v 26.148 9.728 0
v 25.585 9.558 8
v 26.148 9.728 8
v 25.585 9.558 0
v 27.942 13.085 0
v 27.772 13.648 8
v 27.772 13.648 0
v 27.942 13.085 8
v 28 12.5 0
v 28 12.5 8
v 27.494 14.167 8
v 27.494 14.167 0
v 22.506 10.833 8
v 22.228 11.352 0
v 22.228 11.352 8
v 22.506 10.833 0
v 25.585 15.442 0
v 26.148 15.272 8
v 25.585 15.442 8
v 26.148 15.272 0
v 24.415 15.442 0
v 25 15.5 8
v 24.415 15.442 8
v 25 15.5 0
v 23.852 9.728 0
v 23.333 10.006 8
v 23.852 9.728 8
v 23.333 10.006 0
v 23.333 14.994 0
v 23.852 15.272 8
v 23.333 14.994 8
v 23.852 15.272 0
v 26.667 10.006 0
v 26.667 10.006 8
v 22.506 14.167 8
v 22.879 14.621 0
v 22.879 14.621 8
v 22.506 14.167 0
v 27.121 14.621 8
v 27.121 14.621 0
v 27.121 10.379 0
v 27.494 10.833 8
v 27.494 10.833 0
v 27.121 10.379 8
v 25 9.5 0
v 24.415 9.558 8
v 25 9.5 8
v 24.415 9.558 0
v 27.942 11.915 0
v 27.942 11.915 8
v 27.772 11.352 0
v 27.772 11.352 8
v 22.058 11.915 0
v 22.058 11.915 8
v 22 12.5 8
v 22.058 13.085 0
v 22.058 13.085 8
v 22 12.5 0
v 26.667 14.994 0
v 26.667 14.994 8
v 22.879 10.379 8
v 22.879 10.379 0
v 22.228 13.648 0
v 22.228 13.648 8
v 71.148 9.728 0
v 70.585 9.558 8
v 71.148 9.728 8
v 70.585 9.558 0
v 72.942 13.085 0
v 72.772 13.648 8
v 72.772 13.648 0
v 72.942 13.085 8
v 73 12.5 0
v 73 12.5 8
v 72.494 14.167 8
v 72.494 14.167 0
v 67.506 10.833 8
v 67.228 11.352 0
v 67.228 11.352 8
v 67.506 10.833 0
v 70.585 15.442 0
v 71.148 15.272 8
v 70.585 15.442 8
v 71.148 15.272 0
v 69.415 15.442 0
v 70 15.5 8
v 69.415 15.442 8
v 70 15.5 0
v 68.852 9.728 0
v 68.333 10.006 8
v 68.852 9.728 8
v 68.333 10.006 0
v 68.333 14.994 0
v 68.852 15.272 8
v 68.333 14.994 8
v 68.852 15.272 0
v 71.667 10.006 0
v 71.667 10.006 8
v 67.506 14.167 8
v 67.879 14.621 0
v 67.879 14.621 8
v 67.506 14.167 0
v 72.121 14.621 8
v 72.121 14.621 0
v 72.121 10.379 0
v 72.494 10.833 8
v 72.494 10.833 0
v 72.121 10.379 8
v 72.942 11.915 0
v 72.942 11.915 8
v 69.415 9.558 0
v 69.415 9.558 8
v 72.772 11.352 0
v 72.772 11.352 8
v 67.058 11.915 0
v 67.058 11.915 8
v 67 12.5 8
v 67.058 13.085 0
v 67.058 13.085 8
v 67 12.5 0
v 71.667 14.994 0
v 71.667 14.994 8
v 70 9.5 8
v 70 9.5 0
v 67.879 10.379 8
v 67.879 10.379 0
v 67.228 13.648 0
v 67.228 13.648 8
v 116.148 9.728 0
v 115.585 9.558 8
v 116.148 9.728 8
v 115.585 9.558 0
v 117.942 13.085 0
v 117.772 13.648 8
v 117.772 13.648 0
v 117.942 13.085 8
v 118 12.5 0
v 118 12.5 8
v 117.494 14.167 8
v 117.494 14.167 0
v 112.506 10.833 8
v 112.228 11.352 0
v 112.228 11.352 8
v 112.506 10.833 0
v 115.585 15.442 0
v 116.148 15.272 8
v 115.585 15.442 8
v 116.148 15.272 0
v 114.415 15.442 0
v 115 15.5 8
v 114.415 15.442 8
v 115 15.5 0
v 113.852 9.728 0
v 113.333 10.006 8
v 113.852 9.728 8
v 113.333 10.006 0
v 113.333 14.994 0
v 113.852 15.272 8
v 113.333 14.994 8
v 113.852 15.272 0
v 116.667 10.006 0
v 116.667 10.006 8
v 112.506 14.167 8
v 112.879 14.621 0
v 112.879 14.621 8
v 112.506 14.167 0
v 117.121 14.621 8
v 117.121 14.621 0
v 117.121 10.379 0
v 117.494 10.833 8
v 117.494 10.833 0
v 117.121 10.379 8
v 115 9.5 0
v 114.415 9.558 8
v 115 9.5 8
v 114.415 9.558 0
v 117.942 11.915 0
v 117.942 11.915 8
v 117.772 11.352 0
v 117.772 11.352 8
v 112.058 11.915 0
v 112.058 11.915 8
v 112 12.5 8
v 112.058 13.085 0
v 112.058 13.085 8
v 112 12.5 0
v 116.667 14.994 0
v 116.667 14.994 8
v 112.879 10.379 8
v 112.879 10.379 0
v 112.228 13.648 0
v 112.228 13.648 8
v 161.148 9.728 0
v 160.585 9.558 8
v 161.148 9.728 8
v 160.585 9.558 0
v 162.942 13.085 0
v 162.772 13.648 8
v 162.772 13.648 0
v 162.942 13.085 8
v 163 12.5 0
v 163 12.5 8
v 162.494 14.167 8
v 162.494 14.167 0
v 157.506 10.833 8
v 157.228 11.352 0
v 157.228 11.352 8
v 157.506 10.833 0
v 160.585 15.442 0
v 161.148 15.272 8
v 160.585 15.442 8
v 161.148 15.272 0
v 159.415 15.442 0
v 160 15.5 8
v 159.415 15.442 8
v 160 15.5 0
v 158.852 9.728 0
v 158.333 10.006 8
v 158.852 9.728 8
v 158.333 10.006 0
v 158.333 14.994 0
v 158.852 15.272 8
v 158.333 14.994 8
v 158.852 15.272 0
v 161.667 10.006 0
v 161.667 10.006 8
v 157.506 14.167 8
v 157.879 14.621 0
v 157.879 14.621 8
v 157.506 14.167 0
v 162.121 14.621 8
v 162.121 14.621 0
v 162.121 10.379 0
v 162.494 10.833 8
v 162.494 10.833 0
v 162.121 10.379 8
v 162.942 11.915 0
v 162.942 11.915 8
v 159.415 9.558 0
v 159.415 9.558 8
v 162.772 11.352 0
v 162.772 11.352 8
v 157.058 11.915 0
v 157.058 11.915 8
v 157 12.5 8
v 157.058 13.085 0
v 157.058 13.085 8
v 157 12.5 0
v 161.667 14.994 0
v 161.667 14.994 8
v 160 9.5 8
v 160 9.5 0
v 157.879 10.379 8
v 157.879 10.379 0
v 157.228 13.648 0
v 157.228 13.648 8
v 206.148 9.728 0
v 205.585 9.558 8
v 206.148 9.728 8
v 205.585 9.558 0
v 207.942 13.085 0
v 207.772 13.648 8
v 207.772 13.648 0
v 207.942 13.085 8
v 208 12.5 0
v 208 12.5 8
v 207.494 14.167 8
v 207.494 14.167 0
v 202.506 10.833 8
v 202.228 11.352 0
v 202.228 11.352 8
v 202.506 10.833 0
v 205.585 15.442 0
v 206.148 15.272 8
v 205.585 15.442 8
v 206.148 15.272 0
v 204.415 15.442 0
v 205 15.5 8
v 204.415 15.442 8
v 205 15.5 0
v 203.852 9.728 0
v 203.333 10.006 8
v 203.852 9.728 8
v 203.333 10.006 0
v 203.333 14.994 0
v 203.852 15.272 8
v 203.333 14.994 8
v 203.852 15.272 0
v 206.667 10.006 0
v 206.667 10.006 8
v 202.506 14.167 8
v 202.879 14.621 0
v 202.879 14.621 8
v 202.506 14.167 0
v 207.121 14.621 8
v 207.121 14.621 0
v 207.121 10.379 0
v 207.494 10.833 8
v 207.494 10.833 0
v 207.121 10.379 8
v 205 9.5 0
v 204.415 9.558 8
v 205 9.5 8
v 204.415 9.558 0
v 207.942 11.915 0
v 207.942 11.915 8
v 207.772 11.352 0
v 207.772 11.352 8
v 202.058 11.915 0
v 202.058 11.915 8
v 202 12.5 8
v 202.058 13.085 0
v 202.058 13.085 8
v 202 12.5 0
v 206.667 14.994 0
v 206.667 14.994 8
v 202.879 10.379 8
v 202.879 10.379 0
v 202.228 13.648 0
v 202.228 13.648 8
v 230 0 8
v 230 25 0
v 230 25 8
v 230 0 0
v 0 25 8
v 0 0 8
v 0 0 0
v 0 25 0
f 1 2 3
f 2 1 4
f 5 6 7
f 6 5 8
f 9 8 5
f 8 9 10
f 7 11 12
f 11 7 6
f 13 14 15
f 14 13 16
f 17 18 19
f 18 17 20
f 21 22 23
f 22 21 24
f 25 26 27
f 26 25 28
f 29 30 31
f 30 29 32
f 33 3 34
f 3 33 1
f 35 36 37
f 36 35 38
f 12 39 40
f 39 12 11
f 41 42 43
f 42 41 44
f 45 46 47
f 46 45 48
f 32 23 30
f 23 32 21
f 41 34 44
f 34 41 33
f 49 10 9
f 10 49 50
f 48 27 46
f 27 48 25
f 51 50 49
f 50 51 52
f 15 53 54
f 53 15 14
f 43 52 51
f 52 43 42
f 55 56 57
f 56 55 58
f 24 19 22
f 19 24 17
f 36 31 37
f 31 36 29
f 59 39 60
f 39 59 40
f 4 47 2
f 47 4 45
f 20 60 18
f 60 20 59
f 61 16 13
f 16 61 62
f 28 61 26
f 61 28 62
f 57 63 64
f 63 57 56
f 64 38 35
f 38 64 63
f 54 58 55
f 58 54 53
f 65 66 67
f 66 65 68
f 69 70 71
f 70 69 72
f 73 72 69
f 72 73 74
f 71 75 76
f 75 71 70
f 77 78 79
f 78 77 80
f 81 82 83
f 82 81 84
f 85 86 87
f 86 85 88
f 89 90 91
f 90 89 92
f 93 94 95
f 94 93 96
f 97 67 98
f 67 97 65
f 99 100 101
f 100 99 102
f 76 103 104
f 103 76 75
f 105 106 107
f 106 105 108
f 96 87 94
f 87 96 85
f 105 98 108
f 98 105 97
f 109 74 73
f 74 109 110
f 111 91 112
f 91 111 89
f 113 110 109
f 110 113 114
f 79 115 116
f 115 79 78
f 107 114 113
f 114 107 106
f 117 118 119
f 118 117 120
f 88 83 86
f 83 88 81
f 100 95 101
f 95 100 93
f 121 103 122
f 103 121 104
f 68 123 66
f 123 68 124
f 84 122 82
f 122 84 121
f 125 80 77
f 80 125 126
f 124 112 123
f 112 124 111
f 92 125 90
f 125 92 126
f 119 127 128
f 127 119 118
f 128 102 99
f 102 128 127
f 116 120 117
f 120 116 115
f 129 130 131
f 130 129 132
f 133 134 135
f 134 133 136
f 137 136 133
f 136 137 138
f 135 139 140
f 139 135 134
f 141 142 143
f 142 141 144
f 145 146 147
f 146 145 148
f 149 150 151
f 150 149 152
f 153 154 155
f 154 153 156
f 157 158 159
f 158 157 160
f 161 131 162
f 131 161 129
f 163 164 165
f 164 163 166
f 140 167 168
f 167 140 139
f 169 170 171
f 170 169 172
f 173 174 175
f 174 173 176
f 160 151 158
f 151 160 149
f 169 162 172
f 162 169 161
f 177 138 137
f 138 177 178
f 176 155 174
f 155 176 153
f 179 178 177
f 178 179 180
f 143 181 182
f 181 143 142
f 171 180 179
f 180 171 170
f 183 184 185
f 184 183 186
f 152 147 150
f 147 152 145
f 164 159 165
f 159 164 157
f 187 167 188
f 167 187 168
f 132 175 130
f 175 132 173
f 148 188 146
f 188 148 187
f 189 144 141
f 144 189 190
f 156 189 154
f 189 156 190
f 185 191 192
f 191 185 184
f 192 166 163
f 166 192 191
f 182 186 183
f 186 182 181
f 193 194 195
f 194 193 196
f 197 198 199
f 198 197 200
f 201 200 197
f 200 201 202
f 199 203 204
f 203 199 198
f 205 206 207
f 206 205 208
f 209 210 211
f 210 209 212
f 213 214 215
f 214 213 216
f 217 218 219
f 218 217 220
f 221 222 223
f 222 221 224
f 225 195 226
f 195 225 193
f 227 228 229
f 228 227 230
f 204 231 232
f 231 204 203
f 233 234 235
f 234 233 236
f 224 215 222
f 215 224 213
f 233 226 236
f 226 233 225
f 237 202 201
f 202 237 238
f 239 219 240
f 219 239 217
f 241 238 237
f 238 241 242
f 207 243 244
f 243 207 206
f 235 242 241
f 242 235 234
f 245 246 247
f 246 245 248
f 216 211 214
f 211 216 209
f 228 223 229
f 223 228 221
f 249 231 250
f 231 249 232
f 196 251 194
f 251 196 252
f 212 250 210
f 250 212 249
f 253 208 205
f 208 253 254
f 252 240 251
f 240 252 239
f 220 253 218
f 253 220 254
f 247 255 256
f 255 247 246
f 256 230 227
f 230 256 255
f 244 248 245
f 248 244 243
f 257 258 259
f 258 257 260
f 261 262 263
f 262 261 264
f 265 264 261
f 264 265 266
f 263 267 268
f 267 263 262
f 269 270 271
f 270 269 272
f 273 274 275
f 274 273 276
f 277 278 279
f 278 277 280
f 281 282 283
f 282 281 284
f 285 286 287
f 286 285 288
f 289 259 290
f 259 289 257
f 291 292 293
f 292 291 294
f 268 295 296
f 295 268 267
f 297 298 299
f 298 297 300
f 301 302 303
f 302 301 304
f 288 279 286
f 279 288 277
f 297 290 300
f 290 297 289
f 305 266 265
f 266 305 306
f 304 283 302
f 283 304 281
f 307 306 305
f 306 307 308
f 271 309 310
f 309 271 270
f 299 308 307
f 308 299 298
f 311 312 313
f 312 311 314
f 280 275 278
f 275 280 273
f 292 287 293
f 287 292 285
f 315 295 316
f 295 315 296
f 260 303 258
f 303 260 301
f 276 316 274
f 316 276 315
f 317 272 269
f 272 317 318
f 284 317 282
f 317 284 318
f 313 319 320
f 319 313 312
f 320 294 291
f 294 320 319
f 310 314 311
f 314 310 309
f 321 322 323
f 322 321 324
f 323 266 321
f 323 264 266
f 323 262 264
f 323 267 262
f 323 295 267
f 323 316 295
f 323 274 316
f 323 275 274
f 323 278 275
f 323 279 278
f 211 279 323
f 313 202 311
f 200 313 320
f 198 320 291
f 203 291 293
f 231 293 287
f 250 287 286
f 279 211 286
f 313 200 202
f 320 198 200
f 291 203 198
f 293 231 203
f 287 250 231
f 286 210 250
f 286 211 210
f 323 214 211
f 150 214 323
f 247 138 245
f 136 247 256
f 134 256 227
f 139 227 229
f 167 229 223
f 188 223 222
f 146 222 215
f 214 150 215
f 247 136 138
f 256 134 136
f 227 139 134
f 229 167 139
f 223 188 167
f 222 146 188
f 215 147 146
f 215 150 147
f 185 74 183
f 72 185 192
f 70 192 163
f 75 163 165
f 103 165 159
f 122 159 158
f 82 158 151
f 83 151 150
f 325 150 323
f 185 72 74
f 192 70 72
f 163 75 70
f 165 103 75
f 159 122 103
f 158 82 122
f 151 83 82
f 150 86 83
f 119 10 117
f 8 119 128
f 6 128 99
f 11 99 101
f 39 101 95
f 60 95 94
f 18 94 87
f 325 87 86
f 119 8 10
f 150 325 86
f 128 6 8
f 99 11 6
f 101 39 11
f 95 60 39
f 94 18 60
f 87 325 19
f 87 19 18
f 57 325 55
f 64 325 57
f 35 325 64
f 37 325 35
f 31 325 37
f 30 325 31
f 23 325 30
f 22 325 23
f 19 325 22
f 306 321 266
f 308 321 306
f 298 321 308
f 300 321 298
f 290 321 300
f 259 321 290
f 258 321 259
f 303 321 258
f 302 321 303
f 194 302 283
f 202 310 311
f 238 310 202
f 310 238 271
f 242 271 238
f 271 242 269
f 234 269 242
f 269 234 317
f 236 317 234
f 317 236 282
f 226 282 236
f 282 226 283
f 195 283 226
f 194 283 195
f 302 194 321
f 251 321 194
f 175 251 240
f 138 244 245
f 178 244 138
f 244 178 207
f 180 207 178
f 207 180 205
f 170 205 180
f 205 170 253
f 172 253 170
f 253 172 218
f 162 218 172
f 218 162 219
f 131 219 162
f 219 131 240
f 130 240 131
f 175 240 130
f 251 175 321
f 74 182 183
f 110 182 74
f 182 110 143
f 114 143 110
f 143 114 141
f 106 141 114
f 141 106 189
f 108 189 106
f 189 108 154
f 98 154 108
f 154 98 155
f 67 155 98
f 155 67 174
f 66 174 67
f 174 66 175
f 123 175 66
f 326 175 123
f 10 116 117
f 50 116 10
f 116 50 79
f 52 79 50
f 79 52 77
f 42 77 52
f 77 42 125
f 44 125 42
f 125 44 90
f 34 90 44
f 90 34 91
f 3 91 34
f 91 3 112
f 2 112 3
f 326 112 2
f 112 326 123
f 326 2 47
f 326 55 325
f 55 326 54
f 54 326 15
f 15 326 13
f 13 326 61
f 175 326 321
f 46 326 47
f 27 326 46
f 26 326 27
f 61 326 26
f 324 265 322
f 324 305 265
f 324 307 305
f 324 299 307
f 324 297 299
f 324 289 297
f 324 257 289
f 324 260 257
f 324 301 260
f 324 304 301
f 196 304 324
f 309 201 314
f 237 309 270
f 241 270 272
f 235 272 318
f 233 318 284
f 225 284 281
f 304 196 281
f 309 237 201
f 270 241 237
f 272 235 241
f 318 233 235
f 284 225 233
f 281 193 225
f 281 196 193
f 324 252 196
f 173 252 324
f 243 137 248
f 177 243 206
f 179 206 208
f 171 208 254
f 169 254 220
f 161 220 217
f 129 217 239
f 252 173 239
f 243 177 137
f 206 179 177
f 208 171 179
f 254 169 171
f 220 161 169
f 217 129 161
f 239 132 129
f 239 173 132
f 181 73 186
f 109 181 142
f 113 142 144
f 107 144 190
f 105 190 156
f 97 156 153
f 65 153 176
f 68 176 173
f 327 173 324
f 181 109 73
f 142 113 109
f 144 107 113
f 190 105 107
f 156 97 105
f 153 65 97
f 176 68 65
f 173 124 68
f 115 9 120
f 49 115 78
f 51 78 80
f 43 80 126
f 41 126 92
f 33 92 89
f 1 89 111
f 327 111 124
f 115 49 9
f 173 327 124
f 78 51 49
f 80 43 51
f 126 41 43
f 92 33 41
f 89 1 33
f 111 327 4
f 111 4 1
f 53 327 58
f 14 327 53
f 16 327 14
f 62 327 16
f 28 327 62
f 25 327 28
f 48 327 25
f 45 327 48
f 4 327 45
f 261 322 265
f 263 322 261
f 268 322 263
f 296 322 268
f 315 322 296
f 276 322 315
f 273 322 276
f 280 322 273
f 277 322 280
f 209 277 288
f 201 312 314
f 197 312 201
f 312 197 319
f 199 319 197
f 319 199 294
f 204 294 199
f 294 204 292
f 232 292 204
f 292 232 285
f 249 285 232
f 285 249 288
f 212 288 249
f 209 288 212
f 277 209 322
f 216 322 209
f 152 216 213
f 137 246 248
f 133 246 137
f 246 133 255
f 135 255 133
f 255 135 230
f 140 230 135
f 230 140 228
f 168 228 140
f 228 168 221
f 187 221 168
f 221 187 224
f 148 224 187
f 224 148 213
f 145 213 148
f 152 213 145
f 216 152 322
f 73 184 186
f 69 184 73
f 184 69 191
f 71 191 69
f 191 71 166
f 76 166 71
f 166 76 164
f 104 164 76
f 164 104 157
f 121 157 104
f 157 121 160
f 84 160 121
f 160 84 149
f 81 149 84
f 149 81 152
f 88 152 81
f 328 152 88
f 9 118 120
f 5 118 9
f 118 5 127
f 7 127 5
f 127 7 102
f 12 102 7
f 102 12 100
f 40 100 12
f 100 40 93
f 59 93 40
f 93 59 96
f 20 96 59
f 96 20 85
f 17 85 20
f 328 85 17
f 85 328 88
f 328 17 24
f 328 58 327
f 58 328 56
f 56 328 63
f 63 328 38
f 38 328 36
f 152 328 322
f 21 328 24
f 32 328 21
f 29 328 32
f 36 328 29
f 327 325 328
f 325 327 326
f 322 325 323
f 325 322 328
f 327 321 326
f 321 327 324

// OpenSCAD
$fn = 32;

// ----------------------------------------------------------------------
// Long rail: 200-250 mm mounting rail
// ----------------------------------------------------------------------

// --- parameters (mm) ---
rail_l = 230;             // rail length, X
rail_w = 25;              // rail width, Y
rail_t = 8;               // rail thickness, Z
hole_d = 6;               // mounting hole diameter
hole_start = 25;          // first hole offset from the end
hole_pitch = 45;          // hole pitch
holes = 5;                // number of holes
fit_tol = 0.05;           // tolerance for press fits, mm
free_tol = 0.3;           // tolerance for clearance fits, mm

difference() {
  cube([rail_l, rail_w, rail_t]);
  for (i = [0 : holes - 1])
    translate([hole_start + i * hole_pitch, rail_w / 2, -1])
      cylinder(h = rail_t + 2, d = hole_d);
}
